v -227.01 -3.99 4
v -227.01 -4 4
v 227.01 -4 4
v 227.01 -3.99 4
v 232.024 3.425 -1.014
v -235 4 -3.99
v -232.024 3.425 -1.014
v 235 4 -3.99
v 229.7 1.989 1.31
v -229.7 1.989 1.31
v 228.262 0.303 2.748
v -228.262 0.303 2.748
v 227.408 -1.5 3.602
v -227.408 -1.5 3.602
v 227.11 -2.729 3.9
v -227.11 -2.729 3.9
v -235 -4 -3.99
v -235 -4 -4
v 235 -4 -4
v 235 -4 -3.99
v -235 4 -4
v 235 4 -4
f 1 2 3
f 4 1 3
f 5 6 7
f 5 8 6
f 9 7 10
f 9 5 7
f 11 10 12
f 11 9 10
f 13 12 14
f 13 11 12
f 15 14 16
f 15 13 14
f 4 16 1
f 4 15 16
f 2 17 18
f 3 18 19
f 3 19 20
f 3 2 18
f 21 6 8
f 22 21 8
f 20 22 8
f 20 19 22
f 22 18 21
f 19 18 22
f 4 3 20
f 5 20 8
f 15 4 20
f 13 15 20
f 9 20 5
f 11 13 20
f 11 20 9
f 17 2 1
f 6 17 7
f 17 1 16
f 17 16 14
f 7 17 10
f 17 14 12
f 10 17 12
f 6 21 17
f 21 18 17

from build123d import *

# Parameters (mm, degrees)
SKETCH001_W  = 470
SKETCH001_H  = 8
PAD001_DEPTH = 4
CHAMFER_SIZE = 7.99
FILLET_R     = 7.99


with BuildPart() as part:
    # Sketch001 → Pad001 (new body, symmetric)
    with BuildSketch(Plane.XZ):
        Rectangle(SKETCH001_W, SKETCH001_H)
    extrude(amount=PAD001_DEPTH, both=True)

    # Chamfer
    chamfer_edges = [part.edges().sort_by_distance(p)[0] for p in [
        (235, 0, 4),
        (-235, 0, 4),
    ]]
    chamfer(chamfer_edges, length=CHAMFER_SIZE)

    # Fillet
    fillet_edges = [part.edges().sort_by_distance(p)[0] for p in [
        (0, 4, 4),
    ]]
    fillet(fillet_edges, radius=FILLET_R)


solid = part.part
